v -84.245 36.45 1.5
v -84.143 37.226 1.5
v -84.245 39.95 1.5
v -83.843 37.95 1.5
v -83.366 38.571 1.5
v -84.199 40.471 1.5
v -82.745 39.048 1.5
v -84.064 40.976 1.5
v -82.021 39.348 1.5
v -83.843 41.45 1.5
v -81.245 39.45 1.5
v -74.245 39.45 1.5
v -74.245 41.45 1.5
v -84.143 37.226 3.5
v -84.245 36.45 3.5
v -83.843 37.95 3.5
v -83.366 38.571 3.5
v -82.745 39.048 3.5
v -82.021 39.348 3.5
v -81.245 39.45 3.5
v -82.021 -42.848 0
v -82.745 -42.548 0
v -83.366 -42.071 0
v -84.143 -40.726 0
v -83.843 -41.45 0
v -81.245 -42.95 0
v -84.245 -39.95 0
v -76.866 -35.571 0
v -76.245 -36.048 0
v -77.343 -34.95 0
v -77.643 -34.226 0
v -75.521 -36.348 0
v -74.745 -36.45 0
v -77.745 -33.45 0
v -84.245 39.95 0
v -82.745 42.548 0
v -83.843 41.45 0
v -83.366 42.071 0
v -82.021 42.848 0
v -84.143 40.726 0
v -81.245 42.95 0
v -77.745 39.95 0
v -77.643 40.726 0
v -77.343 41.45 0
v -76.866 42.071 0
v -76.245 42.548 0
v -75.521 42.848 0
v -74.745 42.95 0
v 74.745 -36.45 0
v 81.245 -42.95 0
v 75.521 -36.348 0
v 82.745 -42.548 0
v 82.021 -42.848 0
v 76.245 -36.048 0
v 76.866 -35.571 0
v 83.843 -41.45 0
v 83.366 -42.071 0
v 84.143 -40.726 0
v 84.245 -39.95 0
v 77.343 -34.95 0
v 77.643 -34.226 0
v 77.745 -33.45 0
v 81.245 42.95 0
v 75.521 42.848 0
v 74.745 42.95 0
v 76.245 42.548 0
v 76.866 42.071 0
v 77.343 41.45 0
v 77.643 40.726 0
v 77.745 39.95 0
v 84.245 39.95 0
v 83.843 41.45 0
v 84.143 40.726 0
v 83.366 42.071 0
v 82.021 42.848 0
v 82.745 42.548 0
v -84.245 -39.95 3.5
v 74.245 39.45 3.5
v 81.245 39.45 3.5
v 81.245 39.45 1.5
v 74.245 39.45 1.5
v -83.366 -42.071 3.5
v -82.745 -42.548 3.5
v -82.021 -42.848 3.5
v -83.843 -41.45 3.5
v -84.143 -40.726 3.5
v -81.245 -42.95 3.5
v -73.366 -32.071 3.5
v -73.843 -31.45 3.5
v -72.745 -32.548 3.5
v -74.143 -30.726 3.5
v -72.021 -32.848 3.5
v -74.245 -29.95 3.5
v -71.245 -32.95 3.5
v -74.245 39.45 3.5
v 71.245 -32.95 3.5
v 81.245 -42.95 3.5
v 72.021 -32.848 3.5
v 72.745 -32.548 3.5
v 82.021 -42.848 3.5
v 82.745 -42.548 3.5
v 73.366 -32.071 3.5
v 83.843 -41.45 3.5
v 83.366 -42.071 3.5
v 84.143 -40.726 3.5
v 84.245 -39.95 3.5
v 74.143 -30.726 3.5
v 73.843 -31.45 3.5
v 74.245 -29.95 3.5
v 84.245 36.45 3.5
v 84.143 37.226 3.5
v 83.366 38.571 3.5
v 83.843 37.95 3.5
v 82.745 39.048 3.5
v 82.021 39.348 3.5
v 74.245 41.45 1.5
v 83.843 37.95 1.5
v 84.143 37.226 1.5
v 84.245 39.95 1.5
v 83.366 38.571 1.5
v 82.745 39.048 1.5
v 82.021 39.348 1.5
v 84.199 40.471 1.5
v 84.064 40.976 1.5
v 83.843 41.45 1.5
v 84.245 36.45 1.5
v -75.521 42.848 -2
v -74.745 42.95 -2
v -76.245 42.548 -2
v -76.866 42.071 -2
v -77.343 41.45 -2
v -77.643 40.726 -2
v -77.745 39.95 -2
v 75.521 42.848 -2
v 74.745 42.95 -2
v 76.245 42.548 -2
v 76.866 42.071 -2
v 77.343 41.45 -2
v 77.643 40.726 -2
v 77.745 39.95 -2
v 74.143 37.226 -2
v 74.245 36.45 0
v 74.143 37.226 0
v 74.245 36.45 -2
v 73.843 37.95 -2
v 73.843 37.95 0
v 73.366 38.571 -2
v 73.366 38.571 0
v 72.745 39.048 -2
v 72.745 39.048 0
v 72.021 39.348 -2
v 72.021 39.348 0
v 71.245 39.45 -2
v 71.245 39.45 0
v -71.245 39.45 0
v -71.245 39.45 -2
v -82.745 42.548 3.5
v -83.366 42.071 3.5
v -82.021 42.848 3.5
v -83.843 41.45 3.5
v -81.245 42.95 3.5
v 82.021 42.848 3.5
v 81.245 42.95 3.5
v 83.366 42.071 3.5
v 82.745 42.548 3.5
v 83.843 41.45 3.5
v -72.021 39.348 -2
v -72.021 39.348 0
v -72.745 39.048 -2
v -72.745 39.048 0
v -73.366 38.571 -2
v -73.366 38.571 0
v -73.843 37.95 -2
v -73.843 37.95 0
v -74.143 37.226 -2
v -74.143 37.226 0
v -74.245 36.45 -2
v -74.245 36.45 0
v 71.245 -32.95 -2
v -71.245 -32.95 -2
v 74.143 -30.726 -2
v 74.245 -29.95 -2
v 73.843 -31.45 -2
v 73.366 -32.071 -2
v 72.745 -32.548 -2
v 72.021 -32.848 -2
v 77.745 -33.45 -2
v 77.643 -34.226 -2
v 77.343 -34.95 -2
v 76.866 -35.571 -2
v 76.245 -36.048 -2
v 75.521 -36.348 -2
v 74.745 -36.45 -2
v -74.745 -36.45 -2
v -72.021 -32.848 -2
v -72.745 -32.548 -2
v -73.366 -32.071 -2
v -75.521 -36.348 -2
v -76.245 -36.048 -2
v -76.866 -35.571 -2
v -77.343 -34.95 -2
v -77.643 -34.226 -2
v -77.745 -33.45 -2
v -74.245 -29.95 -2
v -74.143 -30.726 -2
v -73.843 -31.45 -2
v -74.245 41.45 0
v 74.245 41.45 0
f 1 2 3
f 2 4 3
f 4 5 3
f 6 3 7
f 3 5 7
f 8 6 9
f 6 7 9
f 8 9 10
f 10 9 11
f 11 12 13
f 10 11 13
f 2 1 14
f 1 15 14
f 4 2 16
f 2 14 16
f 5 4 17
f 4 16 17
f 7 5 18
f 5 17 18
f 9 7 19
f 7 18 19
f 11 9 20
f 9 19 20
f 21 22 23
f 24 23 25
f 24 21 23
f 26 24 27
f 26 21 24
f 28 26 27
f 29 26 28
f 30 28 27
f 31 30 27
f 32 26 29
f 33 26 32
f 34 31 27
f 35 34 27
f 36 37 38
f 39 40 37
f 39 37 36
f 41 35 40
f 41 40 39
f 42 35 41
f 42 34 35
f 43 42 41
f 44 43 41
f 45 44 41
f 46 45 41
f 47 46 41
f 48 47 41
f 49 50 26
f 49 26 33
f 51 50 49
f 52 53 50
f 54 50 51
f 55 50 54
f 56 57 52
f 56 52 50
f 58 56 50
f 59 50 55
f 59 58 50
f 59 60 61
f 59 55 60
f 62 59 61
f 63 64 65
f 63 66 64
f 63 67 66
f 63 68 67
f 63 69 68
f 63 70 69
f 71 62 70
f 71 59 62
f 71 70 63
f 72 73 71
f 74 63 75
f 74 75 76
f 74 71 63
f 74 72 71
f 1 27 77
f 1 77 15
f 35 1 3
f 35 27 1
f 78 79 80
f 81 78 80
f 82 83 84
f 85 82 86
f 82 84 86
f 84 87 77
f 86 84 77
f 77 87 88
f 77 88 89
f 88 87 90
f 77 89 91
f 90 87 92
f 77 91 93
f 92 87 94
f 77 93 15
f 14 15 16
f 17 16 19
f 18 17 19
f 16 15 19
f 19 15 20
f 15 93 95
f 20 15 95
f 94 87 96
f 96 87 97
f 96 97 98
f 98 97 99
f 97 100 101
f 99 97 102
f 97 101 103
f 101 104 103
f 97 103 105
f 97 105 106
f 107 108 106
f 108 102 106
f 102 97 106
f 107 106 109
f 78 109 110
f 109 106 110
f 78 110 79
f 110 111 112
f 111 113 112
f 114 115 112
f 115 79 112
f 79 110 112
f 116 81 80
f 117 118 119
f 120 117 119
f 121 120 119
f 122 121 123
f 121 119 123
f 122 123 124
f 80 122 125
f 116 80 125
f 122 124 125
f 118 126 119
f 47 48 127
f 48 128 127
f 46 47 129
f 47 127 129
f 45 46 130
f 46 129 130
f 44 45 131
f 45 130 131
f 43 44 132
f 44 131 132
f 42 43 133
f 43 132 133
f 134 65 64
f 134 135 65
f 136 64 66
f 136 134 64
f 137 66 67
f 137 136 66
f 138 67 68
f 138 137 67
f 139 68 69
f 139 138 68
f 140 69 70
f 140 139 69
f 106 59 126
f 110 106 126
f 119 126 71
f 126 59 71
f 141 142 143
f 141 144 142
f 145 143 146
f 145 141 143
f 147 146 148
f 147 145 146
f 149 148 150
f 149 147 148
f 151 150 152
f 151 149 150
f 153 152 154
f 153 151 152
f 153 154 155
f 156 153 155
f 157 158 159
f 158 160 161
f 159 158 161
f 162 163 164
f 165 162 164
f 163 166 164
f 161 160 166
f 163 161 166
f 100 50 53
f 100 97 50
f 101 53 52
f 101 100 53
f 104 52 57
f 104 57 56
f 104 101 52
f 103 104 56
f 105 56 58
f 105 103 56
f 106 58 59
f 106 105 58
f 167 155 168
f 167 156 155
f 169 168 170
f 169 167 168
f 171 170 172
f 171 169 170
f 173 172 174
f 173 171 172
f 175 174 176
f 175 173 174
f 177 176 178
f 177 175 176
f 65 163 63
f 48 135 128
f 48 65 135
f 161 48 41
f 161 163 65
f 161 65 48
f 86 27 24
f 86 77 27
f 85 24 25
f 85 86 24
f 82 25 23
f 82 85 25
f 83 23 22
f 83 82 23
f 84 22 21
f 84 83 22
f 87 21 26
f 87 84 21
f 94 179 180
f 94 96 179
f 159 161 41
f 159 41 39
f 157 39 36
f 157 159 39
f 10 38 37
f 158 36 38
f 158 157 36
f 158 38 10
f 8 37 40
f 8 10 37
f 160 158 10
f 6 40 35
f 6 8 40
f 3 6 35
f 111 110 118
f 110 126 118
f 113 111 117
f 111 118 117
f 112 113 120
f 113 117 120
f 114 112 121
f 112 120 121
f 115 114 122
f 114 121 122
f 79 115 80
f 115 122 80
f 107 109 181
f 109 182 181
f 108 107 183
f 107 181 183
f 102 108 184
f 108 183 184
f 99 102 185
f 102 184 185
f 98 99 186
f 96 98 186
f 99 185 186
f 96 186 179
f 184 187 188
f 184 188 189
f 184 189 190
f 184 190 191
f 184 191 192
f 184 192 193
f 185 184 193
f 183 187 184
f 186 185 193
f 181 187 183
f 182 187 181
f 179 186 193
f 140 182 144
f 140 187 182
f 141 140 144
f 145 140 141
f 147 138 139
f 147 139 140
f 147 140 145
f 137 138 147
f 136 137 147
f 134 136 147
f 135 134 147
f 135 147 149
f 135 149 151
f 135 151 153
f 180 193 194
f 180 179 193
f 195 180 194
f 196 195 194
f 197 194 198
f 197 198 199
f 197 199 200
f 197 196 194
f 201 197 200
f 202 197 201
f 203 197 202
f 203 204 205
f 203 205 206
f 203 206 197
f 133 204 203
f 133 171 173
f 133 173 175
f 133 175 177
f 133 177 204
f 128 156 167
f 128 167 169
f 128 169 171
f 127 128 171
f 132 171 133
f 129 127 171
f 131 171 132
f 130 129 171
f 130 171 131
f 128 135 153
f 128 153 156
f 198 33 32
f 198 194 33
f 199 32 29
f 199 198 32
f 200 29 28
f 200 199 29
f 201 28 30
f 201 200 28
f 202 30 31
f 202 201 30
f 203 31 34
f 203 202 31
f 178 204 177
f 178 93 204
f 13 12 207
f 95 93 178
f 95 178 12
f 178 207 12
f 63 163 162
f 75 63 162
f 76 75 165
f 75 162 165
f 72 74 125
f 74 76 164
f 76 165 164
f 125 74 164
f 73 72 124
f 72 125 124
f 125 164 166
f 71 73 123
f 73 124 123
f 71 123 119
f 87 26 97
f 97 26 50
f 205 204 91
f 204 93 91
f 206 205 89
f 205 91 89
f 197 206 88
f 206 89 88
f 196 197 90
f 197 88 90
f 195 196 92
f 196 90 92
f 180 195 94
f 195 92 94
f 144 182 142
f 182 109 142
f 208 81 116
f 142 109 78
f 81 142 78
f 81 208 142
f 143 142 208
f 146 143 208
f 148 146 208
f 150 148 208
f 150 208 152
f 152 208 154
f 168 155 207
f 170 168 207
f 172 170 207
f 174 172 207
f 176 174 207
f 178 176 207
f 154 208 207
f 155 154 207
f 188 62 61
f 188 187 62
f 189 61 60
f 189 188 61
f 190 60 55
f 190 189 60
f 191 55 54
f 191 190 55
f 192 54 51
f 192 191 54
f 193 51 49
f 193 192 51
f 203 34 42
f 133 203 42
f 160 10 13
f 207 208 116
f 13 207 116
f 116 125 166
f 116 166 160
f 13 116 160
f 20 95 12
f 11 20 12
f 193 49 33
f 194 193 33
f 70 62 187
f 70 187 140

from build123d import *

# Parameters (mm, degrees)
SKETCH1_W           = 168.49
SKETCH1_H           = 85.9
BOSS_EXTRUDE1_DEPTH = 3.5
SKETCH2_W           = 148.49
SKETCH2_H           = 75.9
CUT_EXTRUDE1_DEPTH  = 3.5
SKETCH4_W           = 3.5
SKETCH4_H           = 1.5
BOSS_EXTRUDE2_DEPTH = 148.49
SKETCH5_W           = 2
SKETCH5_H           = 2
CUT_EXTRUDE2_DEPTH  = 176.5
FILLET3_R           = 3
FILLET4_R           = 3
SKETCH6_W           = 155.49
SKETCH6_H           = 79.4
SKETCH6_W_2         = 148.49
SKETCH6_H_2         = 72.4
BOSS_EXTRUDE3_DEPTH = 2
FILLET5_R           = 3
FILLET6_R           = 3
FILLET7_R           = 3
FILLET8_R           = 3


with BuildPart() as part:
    # Sketch1 → Boss-Extrude1 (new body)
    with BuildSketch(Plane.XY):
        Rectangle(SKETCH1_W, SKETCH1_H)
    extrude(amount=BOSS_EXTRUDE1_DEPTH)

    # Sketch2 → Cut-Extrude1 (cut)
    with BuildSketch(Plane.XY.offset(3.5)):
        with Locations((0, 5)):
            Rectangle(SKETCH2_W, SKETCH2_H)
    extrude(amount=-CUT_EXTRUDE1_DEPTH, mode=Mode.SUBTRACT)

    # Sketch4 → Boss-Extrude2 (add)
    with BuildSketch(Plane.ZY.offset(-74.245)):
        with Locations((1.75, 42.2)):
            Rectangle(SKETCH4_W, SKETCH4_H)
    extrude(amount=BOSS_EXTRUDE2_DEPTH)

    # Sketch5 → Cut-Extrude2 (cut)
    with BuildSketch(Plane(origin=(84.245, 0, 0), x_dir=(0, 0, -1), z_dir=(1, 0, 0))):
        with Locations((-2.5, 40.45)):
            Rectangle(SKETCH5_W, SKETCH5_H)
    extrude(amount=-CUT_EXTRUDE2_DEPTH, mode=Mode.SUBTRACT)

    # Fillet3
    fillet3_edges = [part.edges().sort_by_distance(p)[0] for p in [
        (-84.245, -42.95, 1.75),
    ]]
    fillet(fillet3_edges, radius=FILLET3_R)

    # Fillet4
    fillet4_edges = [part.edges().sort_by_distance(p)[0] for p in [
        (-84.245, 39.45, 2.5),
        (84.245, -42.95, 1.75),
    ]]
    fillet(fillet4_edges, radius=FILLET4_R)

    # Sketch6 → Boss-Extrude3 (add)
    with BuildSketch(Plane(origin=(0, 0, 0), x_dir=(-1, 0, 0), z_dir=(0, 0, -1))):
        with Locations((0, 3.25)):
            Rectangle(SKETCH6_W, SKETCH6_H)
        with Locations((0, 3.25)):
            Rectangle(SKETCH6_W_2, SKETCH6_H_2, mode=Mode.SUBTRACT)
    extrude(amount=BOSS_EXTRUDE3_DEPTH)

    # Fillet5
    fillet5_edges = [part.edges().sort_by_distance(p)[0] for p in [
        (84.245, 39.45, 2.5),
    ]]
    fillet(fillet5_edges, radius=FILLET5_R)

    # Fillet6
    fillet6_edges = [part.edges().sort_by_distance(p)[0] for p in [
        (-84.245, 42.95, 1.75),
        (84.245, 42.95, 1.75),
    ]]
    fillet(fillet6_edges, radius=FILLET6_R)

    # Fillet7
    fillet7_edges = [part.edges().sort_by_distance(p)[0] for p in [
        (77.745, 42.95, -1),
        (77.745, -36.45, -1),
        (-77.745, -36.45, -1),
        (-77.745, 42.95, -1),
    ]]
    fillet(fillet7_edges, radius=FILLET7_R)

    # Fillet8
    fillet8_edges = [part.edges().sort_by_distance(p)[0] for p in [
        (74.245, 39.45, -1),
        (-74.245, 39.45, -1),
        (-74.245, -32.95, 0.75),
        (74.245, -32.95, 0.75),
    ]]
    fillet(fillet8_edges, radius=FILLET8_R)


solid = part.part
